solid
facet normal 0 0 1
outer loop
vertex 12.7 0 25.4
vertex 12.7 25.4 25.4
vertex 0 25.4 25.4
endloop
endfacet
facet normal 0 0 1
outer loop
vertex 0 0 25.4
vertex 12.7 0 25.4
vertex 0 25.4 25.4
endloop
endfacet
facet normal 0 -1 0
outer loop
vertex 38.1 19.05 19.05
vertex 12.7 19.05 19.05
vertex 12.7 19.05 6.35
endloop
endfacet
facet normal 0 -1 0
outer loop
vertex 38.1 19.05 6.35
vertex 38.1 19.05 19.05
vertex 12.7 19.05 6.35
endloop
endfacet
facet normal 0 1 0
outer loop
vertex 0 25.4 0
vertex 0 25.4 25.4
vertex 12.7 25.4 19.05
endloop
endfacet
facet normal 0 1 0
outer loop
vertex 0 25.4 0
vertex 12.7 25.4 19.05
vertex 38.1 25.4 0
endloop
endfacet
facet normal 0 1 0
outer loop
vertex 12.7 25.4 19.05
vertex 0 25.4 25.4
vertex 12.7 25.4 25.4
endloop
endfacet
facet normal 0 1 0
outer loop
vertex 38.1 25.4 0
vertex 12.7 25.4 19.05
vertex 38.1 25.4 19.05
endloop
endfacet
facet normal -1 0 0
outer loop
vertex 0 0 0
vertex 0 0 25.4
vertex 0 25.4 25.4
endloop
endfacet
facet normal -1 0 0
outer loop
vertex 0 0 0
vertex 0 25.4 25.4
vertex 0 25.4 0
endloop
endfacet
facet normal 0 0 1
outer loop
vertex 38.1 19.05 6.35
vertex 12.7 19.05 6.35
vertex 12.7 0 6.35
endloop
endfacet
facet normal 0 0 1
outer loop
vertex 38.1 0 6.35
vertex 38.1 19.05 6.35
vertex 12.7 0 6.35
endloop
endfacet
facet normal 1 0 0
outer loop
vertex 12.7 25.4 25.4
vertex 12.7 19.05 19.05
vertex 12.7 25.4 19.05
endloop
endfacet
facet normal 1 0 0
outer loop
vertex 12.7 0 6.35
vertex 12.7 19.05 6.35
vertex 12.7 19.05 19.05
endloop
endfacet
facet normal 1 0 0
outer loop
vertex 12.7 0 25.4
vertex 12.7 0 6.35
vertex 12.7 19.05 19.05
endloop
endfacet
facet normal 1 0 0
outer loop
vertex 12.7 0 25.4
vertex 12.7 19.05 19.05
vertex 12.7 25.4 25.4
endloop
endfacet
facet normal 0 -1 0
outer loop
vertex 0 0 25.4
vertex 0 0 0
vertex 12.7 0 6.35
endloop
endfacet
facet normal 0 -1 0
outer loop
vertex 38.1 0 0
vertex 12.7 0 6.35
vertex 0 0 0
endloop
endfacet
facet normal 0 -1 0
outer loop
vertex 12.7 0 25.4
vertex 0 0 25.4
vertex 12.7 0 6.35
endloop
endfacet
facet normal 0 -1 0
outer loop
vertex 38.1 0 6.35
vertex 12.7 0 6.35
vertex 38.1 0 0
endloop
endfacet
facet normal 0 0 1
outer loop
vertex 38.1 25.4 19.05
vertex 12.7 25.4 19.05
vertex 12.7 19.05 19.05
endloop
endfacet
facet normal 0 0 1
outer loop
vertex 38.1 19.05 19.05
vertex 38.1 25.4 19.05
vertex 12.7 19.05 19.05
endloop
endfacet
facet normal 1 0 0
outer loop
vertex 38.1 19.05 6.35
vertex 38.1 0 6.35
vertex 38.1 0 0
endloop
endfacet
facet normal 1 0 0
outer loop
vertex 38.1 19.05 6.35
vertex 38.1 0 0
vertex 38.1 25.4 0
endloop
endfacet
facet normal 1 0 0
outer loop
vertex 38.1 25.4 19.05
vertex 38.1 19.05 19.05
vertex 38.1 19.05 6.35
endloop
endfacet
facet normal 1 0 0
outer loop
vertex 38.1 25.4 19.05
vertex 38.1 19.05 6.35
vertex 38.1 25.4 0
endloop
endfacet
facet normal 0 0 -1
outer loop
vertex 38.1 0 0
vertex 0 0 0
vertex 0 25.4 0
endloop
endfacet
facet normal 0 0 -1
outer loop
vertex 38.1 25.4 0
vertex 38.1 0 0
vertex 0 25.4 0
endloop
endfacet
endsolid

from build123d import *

# Parameters (mm, degrees)
F2_DEPTH = 38.1
F3_DEPTH = 25.4


with BuildPart() as f2:
    # F0 (on Right) → F2 (new body)
    with BuildSketch(Plane.YZ):
        Polygon((0, 6.35), (0, 0), (25.4, 0), (25.4, 19.05), (19.05, 19.05), (19.05, 6.35), align=None)
    extrude(amount=F2_DEPTH)

    # F1 (on Front) → F3 (join)
    with BuildSketch(Plane.XZ):
        Polygon((0, 25.4), (0, 0), (38.1, 0), (38.1, 6.35), (12.7, 6.35), (12.7, 19.05), (12.7, 25.4), align=None)
    extrude(amount=-F3_DEPTH)


solid = f2.part
